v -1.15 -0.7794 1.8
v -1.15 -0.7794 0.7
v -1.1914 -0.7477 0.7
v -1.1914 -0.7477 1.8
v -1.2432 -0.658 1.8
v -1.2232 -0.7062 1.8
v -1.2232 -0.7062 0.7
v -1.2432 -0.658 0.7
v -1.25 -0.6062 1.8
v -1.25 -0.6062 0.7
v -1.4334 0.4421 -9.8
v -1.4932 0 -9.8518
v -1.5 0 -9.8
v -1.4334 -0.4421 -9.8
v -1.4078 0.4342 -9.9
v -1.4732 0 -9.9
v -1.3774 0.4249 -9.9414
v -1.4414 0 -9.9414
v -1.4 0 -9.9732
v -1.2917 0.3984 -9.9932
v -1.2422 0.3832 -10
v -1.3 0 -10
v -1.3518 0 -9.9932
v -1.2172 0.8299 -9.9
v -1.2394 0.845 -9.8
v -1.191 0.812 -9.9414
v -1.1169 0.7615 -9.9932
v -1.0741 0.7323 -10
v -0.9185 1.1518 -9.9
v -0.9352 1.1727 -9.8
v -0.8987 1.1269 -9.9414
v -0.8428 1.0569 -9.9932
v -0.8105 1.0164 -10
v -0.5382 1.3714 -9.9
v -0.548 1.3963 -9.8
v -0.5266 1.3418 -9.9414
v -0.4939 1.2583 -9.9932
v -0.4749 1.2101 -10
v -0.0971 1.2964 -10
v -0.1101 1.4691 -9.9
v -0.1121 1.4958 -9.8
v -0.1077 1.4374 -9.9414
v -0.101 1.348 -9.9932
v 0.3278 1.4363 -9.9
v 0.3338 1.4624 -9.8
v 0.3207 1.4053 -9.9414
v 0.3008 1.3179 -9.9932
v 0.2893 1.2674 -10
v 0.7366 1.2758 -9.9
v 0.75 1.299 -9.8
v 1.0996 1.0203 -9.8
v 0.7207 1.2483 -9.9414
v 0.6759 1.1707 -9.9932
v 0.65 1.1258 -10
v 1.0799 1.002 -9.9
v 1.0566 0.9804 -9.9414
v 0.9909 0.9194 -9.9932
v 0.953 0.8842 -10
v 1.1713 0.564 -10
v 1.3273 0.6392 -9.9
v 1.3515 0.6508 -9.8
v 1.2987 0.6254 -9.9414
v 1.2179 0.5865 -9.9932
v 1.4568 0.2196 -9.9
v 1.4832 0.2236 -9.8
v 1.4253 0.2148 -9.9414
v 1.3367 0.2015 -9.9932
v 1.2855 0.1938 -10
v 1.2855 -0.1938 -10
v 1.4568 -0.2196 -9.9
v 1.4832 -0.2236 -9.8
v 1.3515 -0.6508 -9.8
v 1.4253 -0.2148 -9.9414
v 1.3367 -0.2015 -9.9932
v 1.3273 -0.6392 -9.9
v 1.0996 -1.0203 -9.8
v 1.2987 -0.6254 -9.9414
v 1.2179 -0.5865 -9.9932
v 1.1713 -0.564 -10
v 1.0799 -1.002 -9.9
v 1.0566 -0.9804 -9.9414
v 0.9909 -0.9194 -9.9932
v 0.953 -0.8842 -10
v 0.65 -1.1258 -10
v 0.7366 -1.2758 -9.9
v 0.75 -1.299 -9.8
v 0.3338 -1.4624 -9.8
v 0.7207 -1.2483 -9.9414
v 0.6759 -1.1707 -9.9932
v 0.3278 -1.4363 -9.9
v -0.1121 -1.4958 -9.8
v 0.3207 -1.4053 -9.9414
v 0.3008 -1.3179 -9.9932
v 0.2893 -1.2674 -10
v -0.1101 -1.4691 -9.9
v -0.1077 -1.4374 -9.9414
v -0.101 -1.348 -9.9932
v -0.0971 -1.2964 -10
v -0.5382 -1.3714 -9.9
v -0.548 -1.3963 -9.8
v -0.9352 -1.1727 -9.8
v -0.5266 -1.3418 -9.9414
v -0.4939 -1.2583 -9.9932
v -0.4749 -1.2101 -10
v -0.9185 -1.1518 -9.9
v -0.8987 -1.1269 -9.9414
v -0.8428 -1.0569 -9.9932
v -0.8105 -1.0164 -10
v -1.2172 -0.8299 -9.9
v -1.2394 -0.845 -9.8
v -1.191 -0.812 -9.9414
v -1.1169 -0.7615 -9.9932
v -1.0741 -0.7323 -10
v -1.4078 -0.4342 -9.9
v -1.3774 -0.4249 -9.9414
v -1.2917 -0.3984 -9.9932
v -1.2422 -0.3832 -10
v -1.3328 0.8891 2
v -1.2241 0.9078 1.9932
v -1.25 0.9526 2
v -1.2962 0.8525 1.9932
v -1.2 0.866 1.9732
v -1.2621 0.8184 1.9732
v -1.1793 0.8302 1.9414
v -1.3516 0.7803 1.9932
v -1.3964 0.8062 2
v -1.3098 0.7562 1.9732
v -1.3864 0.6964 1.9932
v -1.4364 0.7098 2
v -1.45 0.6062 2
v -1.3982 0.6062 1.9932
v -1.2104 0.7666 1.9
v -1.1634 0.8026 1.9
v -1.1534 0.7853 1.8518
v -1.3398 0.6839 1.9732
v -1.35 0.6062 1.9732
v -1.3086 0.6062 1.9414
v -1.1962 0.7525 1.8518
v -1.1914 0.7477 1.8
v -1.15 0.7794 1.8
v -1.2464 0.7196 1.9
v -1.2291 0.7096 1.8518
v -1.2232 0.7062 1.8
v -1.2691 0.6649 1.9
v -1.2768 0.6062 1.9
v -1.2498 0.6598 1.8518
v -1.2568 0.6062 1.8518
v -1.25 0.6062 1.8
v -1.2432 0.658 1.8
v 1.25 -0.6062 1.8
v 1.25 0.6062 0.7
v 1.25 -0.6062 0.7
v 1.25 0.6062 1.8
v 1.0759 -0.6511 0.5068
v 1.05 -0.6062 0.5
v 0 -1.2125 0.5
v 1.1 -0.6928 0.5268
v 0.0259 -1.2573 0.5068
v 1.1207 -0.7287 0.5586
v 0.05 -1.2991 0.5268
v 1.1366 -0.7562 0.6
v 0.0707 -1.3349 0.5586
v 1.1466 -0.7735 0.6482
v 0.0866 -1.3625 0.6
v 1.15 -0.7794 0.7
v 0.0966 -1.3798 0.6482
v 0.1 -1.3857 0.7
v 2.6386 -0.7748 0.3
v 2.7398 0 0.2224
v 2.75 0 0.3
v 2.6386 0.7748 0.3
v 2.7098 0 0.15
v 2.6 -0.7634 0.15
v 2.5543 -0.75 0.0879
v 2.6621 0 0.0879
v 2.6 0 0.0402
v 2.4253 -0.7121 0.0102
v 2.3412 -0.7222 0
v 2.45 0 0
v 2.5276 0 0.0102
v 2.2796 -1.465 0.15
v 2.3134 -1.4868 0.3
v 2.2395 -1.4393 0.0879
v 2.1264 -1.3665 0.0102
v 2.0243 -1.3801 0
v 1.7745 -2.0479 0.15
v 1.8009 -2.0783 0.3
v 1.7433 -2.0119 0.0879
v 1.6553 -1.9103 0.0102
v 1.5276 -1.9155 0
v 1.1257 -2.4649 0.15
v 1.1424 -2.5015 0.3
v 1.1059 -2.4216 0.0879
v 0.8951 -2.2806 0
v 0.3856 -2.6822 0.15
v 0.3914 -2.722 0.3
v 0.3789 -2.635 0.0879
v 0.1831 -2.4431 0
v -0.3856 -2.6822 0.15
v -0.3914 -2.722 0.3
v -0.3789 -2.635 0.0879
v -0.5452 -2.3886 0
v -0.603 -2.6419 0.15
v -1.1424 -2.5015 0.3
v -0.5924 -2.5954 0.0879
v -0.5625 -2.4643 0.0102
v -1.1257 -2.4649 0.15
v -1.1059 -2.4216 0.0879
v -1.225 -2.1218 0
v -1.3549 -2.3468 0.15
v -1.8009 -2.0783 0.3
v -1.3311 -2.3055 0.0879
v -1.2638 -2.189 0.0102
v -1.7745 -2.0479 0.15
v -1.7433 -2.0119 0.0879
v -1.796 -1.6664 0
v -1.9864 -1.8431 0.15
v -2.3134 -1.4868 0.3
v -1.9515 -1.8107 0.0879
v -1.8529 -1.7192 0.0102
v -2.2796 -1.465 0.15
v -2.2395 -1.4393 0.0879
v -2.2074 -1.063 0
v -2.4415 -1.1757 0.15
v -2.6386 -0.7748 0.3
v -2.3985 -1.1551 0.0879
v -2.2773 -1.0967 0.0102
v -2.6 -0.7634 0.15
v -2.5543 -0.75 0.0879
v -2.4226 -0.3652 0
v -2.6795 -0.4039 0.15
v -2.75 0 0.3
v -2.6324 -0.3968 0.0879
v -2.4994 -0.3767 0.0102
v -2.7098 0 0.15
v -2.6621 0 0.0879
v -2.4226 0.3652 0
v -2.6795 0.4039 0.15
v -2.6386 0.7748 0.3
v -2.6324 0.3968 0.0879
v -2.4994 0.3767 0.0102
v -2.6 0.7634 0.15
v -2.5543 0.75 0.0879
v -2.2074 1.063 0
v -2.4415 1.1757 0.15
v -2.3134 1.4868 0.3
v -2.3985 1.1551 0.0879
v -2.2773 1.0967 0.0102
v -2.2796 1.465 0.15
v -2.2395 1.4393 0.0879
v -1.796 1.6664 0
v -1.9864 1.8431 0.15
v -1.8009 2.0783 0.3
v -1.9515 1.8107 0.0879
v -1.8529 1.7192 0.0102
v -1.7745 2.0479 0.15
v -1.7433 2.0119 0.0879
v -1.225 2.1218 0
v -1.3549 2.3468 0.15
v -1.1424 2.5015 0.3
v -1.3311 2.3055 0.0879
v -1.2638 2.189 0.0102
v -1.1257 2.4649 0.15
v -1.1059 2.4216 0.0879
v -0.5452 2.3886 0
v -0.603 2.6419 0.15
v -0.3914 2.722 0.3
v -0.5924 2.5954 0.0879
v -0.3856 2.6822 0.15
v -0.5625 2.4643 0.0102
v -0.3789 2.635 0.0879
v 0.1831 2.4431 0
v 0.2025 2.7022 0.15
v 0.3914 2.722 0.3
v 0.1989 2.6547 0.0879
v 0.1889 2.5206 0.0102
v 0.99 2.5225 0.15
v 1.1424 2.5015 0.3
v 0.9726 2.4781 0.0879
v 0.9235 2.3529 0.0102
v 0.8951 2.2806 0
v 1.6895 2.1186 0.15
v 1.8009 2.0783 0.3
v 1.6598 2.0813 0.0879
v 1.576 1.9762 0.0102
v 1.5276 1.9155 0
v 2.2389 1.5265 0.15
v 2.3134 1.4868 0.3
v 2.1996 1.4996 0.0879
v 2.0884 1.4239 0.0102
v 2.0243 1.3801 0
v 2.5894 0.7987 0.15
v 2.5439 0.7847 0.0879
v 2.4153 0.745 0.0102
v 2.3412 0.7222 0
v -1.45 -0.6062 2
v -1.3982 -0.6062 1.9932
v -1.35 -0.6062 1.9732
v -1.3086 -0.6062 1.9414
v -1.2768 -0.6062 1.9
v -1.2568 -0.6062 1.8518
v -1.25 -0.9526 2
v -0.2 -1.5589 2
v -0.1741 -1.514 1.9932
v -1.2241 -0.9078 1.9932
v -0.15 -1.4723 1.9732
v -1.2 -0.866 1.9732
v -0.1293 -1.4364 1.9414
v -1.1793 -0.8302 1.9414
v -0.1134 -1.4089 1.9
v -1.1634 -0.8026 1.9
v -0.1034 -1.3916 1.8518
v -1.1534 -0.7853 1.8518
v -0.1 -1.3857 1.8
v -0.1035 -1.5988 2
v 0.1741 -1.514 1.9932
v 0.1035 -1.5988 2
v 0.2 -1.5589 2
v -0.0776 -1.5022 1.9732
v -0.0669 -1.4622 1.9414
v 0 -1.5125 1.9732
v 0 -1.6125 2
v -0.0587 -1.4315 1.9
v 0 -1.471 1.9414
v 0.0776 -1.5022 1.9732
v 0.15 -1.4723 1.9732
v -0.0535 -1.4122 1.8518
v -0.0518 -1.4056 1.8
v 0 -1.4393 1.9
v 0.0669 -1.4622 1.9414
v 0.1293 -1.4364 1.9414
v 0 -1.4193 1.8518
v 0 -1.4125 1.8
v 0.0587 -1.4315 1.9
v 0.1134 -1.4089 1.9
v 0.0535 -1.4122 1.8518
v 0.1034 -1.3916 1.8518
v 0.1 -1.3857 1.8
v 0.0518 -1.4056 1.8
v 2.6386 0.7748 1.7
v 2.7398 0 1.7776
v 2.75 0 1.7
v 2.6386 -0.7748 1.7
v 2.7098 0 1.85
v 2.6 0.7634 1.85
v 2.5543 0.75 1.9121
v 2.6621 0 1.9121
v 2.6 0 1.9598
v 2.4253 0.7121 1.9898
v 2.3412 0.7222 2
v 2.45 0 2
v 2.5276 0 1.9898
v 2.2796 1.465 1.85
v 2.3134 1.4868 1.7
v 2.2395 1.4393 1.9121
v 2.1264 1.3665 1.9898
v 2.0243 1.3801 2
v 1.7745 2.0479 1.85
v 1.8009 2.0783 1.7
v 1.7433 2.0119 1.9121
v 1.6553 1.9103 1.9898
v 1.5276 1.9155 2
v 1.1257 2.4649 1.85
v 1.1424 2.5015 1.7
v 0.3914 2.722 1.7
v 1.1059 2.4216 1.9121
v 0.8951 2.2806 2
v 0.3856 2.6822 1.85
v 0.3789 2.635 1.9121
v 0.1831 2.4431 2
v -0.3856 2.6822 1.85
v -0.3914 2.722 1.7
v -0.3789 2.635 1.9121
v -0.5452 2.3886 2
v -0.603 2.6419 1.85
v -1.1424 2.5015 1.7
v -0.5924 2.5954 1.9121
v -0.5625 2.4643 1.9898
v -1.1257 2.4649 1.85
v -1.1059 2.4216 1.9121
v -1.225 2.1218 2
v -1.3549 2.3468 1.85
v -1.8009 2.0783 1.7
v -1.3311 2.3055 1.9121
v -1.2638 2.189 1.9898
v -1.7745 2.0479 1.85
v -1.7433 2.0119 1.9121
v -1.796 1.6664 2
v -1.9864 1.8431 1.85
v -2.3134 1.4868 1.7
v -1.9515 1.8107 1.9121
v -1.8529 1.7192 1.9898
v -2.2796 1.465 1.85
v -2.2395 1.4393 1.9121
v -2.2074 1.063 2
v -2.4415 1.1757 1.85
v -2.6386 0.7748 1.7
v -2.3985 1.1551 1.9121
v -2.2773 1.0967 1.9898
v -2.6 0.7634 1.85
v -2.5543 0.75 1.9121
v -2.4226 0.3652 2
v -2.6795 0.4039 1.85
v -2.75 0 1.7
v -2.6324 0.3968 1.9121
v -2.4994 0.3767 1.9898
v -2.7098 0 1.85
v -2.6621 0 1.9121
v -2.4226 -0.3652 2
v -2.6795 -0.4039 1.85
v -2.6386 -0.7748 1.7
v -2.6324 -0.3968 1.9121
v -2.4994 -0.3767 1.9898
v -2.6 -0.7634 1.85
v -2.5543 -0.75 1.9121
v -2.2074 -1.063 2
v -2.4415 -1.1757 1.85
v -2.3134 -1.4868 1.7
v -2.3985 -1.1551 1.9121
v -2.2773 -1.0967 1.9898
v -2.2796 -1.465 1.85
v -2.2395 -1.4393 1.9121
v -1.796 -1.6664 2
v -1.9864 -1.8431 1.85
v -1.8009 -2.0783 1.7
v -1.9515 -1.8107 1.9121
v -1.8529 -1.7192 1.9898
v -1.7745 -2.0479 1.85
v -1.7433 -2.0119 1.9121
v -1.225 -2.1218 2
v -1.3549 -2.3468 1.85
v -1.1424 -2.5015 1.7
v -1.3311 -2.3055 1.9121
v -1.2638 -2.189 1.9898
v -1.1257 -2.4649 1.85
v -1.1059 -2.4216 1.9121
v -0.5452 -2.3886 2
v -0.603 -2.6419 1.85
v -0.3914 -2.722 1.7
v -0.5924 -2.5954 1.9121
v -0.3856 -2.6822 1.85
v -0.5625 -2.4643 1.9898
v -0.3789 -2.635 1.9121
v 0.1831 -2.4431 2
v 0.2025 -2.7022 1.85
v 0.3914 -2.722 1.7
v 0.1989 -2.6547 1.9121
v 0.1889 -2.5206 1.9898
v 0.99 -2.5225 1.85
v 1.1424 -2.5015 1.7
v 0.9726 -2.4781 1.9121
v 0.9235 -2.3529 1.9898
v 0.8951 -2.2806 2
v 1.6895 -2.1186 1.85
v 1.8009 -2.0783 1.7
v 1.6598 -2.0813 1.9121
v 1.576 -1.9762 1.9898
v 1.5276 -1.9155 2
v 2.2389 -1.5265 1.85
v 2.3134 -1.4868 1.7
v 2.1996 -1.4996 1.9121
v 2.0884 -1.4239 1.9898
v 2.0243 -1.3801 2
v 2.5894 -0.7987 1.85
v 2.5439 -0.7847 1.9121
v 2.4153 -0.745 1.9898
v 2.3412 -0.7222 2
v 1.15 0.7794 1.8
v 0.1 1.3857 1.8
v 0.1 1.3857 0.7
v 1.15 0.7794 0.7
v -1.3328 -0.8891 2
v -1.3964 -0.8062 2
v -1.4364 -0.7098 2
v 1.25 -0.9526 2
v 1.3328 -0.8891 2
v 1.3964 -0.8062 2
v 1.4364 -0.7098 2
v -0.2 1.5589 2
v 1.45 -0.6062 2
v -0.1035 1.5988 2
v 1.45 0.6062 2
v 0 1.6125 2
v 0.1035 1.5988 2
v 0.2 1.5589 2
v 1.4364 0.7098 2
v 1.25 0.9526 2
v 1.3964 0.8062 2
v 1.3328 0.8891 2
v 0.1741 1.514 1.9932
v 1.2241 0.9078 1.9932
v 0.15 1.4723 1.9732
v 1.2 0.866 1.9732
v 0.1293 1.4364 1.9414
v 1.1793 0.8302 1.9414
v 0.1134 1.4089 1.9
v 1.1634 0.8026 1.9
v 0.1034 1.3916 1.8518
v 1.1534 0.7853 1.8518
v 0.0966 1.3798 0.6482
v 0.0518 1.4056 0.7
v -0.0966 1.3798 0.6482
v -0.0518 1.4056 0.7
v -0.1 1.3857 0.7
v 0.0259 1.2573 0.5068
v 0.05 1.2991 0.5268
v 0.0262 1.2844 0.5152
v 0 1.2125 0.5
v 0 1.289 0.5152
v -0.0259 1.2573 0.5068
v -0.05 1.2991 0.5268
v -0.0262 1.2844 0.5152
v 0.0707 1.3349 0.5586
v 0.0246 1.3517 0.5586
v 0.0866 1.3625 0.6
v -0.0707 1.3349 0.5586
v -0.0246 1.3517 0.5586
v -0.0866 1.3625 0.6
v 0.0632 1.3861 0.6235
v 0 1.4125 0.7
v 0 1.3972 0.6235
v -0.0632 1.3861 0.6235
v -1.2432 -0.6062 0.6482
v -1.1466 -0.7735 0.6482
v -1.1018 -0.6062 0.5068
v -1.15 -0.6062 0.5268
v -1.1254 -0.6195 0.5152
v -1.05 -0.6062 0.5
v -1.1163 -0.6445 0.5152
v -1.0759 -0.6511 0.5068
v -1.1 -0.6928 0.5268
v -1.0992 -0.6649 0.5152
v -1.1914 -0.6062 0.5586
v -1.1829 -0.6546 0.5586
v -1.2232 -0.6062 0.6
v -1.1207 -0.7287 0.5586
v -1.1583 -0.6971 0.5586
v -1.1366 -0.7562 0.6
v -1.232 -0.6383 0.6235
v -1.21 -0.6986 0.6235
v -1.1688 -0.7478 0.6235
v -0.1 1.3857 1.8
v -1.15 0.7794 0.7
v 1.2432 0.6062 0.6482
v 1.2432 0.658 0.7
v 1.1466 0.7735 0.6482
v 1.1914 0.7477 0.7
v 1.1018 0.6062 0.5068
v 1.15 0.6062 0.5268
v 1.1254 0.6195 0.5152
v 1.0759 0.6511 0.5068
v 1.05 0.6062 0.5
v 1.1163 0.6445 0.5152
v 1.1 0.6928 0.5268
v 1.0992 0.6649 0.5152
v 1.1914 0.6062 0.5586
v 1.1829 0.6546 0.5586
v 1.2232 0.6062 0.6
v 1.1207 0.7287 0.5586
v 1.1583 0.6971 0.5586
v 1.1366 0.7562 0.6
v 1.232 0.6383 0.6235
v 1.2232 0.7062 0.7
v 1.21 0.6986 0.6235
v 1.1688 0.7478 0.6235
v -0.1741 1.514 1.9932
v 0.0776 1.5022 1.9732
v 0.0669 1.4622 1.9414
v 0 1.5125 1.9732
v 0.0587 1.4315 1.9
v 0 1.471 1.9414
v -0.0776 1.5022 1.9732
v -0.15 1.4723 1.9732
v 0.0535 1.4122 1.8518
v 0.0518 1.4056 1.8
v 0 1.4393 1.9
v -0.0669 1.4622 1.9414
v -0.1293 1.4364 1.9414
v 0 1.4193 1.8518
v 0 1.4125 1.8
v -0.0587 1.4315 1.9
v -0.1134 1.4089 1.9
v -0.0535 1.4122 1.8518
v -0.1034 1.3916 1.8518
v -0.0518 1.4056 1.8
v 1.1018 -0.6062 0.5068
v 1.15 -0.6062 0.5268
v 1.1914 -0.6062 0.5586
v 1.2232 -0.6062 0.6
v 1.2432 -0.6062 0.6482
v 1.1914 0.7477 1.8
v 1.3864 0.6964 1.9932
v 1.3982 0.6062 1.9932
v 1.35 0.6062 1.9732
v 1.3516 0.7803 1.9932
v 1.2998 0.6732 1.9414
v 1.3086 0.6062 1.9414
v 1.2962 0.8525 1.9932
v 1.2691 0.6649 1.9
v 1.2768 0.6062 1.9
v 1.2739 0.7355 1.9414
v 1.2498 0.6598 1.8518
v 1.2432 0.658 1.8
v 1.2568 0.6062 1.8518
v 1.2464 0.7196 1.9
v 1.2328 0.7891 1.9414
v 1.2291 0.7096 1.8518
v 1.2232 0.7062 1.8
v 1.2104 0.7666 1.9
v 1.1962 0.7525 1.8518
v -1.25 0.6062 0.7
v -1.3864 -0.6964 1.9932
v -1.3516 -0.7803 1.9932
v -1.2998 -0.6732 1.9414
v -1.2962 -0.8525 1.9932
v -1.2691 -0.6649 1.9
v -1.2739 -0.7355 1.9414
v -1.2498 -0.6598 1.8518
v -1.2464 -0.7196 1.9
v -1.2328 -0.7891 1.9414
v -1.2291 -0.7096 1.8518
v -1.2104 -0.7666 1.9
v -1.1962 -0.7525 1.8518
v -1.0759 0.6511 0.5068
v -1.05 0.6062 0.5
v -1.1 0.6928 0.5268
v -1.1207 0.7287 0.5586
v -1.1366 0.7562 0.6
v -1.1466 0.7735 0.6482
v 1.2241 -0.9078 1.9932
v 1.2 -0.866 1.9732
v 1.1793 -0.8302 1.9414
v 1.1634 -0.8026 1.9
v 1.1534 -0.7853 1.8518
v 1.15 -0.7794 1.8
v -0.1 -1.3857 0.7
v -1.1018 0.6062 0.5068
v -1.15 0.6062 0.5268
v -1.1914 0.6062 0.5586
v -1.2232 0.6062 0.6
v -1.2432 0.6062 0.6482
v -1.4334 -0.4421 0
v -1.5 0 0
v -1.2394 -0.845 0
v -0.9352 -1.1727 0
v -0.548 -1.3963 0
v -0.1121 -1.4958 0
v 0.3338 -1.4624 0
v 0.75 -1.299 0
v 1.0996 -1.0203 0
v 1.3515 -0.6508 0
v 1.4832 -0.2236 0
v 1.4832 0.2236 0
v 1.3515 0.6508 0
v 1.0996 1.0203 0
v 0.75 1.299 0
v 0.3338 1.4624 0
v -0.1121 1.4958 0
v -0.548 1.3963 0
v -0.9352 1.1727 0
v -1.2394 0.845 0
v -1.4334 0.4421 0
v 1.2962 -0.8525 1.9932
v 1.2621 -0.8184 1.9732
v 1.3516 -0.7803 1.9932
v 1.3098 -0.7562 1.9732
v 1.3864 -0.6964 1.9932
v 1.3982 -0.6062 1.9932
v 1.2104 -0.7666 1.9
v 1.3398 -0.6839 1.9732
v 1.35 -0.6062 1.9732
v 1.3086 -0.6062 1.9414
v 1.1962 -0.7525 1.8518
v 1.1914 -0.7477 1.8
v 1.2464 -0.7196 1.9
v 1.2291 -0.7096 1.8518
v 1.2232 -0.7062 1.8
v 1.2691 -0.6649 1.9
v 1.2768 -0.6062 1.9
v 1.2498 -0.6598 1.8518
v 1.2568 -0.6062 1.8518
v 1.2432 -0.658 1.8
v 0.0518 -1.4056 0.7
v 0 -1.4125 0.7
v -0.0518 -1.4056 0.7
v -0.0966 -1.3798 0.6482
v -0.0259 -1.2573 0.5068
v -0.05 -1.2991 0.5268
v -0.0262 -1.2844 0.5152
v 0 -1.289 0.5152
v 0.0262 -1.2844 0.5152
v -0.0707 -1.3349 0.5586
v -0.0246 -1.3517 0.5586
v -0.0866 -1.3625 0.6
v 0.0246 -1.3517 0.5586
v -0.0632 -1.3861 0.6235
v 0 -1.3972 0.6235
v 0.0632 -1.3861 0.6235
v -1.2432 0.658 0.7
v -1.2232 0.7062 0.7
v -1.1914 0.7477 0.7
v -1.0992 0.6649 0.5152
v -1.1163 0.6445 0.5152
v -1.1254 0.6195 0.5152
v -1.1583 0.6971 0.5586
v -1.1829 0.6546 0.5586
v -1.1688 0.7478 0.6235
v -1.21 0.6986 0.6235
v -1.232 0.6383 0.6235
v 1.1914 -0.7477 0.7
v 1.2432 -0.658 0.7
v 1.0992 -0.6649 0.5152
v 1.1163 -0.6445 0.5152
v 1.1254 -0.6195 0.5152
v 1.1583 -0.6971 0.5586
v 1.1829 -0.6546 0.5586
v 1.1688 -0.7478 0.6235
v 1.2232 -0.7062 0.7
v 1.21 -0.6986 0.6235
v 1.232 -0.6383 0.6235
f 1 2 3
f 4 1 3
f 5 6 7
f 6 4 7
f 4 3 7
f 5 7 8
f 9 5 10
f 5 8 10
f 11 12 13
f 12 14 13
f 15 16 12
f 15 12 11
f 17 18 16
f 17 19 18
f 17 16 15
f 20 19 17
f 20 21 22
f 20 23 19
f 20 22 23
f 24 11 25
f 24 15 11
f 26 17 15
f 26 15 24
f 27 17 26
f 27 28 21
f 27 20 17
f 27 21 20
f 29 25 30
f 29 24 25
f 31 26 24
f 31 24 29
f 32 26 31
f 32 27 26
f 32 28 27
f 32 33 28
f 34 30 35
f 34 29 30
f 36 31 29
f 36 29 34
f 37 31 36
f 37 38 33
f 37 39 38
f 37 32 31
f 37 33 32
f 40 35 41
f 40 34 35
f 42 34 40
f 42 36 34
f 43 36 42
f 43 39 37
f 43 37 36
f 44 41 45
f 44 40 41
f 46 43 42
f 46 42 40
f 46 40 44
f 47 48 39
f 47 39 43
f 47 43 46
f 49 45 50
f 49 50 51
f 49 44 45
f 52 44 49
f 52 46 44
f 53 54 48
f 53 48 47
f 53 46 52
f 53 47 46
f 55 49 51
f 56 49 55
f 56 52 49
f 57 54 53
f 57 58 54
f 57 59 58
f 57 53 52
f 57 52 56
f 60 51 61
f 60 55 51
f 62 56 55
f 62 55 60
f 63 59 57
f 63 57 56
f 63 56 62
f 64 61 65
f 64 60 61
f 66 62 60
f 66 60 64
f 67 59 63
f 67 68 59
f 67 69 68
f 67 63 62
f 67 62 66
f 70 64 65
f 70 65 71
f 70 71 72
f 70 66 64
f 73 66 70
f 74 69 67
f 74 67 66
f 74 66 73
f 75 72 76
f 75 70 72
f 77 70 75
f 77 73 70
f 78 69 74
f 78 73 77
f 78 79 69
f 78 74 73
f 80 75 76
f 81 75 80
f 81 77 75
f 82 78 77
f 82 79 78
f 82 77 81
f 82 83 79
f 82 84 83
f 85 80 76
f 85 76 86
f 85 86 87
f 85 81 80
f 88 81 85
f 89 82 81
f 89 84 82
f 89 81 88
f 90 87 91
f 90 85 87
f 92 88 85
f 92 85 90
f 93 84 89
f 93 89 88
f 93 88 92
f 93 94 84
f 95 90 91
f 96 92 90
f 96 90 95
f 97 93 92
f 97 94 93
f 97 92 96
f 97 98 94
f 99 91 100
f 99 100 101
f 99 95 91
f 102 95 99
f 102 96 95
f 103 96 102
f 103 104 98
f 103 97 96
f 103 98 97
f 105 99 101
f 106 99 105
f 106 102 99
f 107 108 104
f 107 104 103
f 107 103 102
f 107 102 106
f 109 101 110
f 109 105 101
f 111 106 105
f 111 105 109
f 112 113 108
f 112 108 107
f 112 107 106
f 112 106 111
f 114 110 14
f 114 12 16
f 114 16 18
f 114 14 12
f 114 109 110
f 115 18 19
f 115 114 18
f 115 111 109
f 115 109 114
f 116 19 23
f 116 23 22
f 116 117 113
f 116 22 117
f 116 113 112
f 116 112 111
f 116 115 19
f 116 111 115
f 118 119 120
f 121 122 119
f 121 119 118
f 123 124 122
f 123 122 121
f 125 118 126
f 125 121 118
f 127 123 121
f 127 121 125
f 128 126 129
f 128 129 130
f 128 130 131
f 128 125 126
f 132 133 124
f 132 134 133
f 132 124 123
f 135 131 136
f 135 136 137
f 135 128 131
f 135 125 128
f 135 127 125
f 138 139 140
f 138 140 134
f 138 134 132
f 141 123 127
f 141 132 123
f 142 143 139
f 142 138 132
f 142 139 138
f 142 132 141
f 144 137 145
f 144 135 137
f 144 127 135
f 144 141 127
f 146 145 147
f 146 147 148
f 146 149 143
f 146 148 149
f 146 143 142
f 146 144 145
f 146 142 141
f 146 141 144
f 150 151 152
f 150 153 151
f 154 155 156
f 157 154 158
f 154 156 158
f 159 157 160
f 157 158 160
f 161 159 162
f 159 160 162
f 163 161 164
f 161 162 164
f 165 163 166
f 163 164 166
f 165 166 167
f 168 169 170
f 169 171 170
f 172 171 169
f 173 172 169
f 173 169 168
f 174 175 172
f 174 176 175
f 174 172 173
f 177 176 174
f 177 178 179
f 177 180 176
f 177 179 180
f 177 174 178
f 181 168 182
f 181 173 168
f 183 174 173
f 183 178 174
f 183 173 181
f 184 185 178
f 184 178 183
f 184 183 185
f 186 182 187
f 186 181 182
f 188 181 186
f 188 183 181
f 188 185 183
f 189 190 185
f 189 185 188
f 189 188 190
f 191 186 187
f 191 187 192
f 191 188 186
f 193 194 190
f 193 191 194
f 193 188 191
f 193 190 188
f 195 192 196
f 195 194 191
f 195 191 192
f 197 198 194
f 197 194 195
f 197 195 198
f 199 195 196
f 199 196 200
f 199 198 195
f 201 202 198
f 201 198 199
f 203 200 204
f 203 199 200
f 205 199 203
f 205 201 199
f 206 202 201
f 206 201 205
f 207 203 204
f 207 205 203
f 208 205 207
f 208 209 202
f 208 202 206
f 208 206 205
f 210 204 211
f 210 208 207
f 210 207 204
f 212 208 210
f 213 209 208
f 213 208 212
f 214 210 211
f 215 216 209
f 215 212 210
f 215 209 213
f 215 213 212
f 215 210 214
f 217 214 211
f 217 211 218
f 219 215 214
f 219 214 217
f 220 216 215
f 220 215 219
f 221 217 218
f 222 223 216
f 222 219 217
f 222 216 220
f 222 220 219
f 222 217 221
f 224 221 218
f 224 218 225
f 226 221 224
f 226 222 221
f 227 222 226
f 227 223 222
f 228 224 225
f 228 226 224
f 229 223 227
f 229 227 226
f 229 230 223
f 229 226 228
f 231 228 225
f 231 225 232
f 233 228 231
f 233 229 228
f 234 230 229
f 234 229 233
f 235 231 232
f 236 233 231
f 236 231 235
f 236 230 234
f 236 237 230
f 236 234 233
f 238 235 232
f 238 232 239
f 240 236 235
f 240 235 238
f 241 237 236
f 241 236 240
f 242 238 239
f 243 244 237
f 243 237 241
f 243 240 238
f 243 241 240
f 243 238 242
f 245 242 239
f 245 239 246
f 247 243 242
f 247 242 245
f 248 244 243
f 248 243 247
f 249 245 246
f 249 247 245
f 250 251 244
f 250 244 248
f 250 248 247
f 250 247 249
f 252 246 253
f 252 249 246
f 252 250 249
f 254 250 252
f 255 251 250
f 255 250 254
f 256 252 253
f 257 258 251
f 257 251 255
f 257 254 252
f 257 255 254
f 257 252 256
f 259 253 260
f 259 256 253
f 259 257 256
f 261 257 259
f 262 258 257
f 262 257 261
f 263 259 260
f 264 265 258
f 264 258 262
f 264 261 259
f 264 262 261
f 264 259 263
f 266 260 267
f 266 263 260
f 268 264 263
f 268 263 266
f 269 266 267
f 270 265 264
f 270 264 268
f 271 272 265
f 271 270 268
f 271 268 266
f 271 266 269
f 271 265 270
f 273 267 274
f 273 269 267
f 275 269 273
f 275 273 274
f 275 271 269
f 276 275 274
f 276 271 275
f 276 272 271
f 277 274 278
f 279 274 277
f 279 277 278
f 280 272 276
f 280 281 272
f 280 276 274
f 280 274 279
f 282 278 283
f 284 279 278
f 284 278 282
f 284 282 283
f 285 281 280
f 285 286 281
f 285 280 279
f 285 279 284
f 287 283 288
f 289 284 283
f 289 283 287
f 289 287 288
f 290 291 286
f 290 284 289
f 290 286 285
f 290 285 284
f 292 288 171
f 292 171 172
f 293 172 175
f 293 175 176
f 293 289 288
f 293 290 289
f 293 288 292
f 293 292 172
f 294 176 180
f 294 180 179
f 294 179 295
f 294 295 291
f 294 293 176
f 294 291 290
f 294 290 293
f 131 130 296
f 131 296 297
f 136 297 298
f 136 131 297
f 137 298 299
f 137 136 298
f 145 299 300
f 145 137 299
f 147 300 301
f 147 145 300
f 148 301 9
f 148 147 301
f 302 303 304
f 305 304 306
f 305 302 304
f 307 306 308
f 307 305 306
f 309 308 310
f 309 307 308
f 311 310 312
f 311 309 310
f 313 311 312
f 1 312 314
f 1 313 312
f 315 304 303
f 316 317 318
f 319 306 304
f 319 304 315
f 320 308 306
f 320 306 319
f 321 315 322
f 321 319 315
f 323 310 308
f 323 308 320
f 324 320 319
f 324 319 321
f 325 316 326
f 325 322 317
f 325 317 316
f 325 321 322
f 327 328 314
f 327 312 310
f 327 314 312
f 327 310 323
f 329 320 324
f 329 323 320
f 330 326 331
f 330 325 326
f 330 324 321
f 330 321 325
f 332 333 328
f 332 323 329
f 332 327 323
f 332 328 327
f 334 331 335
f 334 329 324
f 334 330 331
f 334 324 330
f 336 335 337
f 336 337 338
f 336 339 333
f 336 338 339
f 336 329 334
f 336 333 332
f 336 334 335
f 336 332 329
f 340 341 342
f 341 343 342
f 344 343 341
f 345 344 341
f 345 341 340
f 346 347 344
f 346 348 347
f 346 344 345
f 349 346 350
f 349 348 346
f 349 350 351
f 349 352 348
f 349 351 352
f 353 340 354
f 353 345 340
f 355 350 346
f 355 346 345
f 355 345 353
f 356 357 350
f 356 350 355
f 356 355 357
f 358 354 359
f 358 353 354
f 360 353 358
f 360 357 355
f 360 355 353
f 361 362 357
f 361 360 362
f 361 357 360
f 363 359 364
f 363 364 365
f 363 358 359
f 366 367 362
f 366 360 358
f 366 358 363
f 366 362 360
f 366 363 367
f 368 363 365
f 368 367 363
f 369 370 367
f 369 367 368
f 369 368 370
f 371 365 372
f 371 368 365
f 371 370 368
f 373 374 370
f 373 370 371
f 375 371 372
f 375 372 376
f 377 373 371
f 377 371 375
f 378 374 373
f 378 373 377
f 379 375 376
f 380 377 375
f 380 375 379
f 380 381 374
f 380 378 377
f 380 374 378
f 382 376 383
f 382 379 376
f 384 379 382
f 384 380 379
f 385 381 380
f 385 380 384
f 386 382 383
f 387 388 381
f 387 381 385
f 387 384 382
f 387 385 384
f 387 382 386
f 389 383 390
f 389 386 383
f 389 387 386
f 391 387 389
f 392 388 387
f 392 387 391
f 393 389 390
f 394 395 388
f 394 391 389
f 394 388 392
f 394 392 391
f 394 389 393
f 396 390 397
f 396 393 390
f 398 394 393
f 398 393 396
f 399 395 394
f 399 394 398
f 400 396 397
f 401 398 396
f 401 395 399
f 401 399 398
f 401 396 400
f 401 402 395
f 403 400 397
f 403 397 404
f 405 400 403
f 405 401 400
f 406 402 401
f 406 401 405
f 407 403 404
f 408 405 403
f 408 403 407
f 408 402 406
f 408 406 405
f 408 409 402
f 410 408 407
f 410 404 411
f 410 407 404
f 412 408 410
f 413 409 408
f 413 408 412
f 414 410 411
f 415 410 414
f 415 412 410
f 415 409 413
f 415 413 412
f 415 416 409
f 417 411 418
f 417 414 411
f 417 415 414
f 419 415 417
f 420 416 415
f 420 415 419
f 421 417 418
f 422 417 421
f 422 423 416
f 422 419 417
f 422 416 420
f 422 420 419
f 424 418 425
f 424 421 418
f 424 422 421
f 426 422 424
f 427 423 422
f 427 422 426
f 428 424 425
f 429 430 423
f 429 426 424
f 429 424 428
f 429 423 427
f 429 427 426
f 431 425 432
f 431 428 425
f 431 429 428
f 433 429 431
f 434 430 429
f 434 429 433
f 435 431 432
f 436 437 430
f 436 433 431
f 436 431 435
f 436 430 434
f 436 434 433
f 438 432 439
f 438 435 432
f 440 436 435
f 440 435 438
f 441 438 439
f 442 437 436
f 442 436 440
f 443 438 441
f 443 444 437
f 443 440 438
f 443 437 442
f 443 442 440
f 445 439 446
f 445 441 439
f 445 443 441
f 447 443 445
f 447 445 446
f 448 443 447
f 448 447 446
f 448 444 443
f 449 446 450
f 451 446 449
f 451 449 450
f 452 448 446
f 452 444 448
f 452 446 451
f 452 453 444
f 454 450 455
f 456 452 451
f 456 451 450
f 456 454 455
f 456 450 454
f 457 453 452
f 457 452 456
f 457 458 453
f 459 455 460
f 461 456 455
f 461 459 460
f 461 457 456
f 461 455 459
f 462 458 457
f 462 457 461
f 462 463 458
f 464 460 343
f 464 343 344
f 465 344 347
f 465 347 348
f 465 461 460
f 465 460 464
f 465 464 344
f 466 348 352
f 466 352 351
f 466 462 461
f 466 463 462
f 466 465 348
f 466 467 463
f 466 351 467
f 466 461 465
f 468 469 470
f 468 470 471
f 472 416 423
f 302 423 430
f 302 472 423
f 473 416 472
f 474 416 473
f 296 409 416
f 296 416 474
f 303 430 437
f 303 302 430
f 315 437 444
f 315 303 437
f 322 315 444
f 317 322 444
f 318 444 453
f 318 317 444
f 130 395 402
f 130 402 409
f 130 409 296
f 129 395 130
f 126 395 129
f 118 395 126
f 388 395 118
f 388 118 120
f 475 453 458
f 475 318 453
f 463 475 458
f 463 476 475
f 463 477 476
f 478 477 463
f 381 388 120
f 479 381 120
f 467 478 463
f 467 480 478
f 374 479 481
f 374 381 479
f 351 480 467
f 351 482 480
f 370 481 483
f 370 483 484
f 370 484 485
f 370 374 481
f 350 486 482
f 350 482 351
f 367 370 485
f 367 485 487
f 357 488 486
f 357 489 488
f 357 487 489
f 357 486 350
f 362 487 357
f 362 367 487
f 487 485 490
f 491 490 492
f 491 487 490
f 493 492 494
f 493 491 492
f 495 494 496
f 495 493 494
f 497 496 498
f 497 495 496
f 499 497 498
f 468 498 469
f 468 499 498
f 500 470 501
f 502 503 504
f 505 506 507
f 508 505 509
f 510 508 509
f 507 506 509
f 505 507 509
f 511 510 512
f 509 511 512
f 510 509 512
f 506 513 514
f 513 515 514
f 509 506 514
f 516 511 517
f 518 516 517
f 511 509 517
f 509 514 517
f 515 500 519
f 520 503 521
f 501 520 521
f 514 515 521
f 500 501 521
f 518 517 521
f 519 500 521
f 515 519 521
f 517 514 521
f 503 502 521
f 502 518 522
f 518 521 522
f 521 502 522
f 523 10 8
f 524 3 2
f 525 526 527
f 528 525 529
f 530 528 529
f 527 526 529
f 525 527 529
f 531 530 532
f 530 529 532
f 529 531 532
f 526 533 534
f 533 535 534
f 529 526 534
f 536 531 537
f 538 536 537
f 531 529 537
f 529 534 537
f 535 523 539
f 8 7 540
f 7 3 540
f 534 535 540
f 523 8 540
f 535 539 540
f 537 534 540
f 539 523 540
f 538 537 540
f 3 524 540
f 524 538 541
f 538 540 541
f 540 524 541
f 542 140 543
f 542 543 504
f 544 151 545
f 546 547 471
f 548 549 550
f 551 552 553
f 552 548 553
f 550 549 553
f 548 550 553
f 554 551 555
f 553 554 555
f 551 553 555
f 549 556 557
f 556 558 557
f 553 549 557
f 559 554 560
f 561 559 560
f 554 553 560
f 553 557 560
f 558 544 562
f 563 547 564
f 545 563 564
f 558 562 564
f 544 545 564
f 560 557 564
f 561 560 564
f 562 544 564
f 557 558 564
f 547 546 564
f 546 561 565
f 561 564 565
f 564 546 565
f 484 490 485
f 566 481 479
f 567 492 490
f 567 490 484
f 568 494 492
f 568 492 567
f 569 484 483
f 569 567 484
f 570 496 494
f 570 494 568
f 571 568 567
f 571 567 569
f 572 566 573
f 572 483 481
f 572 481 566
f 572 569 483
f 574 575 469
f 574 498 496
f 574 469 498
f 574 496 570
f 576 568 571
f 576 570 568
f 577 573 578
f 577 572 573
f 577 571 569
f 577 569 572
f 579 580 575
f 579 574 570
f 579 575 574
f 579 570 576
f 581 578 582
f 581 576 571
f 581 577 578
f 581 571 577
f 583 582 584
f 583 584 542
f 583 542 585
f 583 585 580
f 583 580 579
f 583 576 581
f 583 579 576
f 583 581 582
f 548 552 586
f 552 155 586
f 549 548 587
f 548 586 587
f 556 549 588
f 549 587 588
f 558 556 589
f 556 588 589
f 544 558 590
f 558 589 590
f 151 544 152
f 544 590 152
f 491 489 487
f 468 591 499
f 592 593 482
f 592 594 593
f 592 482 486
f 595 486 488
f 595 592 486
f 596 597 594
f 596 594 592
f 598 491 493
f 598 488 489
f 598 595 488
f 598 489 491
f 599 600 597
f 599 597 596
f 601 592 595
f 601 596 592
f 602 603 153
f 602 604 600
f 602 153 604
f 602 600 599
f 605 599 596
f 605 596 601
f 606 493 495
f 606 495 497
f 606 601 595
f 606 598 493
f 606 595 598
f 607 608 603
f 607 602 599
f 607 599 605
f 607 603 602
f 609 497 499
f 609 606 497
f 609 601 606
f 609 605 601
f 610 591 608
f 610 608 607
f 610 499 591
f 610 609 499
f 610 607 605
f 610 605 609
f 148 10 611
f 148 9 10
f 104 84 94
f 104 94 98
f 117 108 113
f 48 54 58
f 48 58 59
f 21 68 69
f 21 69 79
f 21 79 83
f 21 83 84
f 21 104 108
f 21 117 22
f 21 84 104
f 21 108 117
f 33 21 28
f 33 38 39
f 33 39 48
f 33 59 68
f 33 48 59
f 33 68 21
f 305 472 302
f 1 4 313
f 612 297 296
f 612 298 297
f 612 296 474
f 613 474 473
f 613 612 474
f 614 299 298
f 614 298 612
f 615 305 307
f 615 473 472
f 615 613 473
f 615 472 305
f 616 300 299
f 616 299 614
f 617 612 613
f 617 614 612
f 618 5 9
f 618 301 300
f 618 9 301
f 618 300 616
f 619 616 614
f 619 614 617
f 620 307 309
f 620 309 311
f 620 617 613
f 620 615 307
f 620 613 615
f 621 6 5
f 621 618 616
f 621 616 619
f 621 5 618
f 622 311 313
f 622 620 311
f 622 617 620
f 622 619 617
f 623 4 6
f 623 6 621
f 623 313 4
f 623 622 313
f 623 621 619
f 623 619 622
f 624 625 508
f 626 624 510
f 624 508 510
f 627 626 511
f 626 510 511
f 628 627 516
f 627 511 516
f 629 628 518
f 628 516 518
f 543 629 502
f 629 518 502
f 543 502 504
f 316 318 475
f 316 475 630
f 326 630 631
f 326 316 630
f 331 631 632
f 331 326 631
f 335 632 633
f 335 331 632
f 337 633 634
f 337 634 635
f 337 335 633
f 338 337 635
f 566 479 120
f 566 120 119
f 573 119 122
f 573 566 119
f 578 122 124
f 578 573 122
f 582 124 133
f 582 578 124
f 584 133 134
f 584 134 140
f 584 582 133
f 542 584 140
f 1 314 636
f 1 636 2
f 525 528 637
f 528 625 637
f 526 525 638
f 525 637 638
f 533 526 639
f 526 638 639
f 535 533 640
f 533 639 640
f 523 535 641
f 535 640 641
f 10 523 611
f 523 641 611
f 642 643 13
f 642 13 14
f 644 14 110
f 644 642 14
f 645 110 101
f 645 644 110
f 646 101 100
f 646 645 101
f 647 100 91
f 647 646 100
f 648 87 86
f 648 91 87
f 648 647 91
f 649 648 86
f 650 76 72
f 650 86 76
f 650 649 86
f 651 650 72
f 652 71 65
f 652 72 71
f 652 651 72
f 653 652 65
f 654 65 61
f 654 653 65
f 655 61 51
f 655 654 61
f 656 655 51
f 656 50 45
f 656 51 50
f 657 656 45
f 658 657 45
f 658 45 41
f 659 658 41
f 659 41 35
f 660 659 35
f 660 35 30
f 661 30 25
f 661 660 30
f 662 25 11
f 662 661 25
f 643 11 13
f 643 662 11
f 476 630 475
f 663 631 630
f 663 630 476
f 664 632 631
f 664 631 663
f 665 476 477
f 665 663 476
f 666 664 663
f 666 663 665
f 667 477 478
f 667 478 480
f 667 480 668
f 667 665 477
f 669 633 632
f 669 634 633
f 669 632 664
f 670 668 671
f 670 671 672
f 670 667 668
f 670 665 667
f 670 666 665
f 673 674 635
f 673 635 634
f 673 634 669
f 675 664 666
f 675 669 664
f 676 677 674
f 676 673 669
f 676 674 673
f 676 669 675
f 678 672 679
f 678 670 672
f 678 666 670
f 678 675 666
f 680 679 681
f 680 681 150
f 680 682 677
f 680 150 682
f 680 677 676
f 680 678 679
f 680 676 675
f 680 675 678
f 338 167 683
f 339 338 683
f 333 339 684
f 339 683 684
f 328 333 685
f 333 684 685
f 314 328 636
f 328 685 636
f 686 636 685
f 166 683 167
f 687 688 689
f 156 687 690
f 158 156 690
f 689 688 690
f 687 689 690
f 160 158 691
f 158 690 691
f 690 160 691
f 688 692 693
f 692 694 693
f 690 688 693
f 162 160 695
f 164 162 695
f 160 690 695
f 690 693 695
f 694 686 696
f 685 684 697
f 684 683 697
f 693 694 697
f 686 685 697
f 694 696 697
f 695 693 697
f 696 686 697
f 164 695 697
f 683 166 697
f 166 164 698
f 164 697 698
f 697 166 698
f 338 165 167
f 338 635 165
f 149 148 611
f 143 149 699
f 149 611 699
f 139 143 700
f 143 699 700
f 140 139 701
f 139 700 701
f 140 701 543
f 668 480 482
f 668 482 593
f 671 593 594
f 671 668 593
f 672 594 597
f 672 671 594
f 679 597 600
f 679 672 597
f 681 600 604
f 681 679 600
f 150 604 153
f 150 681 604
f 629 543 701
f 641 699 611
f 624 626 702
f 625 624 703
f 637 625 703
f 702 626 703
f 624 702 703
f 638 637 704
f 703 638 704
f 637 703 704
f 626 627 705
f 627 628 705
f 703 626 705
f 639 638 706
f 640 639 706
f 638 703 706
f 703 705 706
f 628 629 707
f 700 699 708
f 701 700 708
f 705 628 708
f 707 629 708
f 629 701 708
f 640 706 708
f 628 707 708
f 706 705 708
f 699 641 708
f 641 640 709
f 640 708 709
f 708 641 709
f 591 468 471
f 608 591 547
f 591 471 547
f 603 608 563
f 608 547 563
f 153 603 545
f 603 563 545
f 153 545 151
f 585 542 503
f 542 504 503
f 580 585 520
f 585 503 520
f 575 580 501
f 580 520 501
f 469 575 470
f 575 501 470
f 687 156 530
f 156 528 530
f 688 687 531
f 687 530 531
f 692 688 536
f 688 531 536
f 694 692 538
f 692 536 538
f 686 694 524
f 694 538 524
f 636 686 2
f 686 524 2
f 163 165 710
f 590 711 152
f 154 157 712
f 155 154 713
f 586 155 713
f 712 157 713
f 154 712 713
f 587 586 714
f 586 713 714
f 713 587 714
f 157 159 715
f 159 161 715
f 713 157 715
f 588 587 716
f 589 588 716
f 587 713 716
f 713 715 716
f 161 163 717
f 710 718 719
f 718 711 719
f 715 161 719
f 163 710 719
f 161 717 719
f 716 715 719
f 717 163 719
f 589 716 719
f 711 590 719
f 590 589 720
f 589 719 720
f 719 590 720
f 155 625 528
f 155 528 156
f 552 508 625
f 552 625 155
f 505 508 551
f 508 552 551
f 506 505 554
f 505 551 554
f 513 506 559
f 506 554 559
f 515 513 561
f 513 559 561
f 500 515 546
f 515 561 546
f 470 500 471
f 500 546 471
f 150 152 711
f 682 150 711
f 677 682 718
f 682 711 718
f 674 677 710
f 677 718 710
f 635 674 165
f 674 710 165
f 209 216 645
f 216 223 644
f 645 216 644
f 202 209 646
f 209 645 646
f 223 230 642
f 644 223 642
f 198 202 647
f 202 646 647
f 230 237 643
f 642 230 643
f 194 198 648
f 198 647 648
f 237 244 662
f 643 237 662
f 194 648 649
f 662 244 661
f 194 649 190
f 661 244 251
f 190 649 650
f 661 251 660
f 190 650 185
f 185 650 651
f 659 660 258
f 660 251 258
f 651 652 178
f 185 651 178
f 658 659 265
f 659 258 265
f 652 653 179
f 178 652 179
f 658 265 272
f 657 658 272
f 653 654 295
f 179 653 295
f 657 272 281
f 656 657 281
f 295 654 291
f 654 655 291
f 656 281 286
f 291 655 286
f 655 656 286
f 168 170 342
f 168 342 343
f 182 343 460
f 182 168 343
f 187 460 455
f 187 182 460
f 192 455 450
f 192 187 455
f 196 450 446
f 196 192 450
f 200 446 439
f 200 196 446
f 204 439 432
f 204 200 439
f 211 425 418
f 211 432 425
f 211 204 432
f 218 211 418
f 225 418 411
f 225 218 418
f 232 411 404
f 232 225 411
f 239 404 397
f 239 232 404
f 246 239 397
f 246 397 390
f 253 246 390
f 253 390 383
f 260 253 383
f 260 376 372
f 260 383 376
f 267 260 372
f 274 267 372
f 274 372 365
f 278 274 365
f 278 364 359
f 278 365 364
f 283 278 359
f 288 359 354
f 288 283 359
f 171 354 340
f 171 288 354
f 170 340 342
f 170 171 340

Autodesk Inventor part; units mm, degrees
ref_plane "YZ Plane" through (0, 0, 0) normal (1, 0, 0) x (0, 1, 0)
ref_plane "XZ Plane" through (0, 0, 0) normal (0, 1, 0) x (-1, 0, 0)
ref_plane "XY Plane" through (0, 0, 0) normal (0, 0, 1) x (1, 0, 0)
sketch "スケッチ1" plane through (0, 0, 0) normal (0, 0, 1) x (1, 0, 0)
  circle A0 centre (0, 0) radius 2.75
  dimension "d0" = 5.5
extrude "押し出し1" add sketch "スケッチ1" along normal blind 2
sketch "スケッチ2" plane through (0, 0, 0) normal (0, 0, -1) x (-1, 0, 0)
  circle A0 centre (0, 0) radius 2.75 projected
  circle A1 centre (0, 0) radius 1.5
  dimension "d3" = 3
extrude "押し出し2" add sketch "スケッチ2" along normal blind 10 contours A1
sketch "スケッチ3" plane through (0, 0, 2) normal (0, 0, 1) x (1, 0, 0)
  circle A0 centre (0, 0) radius 2.75 projected
  line L0 (0, 1.4434) -> (1.25, 0.7217)
  line L1 (1.25, 0.7217) -> (1.25, -0.7217)
  line L2 (1.25, -0.7217) -> (0, -1.4434)
  line L3 (0, -1.4434) -> (-1.25, -0.7217)
  line L4 (-1.25, -0.7217) -> (-1.25, 0.7217)
  line L5 (-1.25, 0.7217) -> (0, 1.4434)
  dimension "d6" = 1.25
extrude "押し出し3" cut sketch "スケッチ3" against normal blind 1.5 contours L0 L1 L2 L3 L4 L5
fillet "フィレット1" radius 0.3 2 edges at (-2.75, 0, 2) (-2.75, 0, 0)
fillet "フィレット2" radius 0.2 19 edges at (-0.625, 1.0825, 2) (-1.25, 0, 2) (-0.625, -1.0825, 2) (0.625, -1.0825, 2) (1.25, 0, 2) (0.625, 1.0825, 2) (-0.625, 1.0825, 0.5) (0.625, 1.0825, 0.5) (0, 1.4434, 1.25) (-1.25, 0.7217, 1.25) (-0.625, -1.0825, 0.5) (-1.25, -0.7217, 1.25) (-1.25, 0, 0.5) (1.25, 0, 0.5) (1.25, 0.7217, 1.25) (1.25, -0.7217, 1.25) (0.625, -1.0825, 0.5) (0, -1.4434, 1.25) (1.5, 0, -10)
thread "ねじ2" size "M3x0.5" class "6g" standard "ANSI Metric M Profile" full length
